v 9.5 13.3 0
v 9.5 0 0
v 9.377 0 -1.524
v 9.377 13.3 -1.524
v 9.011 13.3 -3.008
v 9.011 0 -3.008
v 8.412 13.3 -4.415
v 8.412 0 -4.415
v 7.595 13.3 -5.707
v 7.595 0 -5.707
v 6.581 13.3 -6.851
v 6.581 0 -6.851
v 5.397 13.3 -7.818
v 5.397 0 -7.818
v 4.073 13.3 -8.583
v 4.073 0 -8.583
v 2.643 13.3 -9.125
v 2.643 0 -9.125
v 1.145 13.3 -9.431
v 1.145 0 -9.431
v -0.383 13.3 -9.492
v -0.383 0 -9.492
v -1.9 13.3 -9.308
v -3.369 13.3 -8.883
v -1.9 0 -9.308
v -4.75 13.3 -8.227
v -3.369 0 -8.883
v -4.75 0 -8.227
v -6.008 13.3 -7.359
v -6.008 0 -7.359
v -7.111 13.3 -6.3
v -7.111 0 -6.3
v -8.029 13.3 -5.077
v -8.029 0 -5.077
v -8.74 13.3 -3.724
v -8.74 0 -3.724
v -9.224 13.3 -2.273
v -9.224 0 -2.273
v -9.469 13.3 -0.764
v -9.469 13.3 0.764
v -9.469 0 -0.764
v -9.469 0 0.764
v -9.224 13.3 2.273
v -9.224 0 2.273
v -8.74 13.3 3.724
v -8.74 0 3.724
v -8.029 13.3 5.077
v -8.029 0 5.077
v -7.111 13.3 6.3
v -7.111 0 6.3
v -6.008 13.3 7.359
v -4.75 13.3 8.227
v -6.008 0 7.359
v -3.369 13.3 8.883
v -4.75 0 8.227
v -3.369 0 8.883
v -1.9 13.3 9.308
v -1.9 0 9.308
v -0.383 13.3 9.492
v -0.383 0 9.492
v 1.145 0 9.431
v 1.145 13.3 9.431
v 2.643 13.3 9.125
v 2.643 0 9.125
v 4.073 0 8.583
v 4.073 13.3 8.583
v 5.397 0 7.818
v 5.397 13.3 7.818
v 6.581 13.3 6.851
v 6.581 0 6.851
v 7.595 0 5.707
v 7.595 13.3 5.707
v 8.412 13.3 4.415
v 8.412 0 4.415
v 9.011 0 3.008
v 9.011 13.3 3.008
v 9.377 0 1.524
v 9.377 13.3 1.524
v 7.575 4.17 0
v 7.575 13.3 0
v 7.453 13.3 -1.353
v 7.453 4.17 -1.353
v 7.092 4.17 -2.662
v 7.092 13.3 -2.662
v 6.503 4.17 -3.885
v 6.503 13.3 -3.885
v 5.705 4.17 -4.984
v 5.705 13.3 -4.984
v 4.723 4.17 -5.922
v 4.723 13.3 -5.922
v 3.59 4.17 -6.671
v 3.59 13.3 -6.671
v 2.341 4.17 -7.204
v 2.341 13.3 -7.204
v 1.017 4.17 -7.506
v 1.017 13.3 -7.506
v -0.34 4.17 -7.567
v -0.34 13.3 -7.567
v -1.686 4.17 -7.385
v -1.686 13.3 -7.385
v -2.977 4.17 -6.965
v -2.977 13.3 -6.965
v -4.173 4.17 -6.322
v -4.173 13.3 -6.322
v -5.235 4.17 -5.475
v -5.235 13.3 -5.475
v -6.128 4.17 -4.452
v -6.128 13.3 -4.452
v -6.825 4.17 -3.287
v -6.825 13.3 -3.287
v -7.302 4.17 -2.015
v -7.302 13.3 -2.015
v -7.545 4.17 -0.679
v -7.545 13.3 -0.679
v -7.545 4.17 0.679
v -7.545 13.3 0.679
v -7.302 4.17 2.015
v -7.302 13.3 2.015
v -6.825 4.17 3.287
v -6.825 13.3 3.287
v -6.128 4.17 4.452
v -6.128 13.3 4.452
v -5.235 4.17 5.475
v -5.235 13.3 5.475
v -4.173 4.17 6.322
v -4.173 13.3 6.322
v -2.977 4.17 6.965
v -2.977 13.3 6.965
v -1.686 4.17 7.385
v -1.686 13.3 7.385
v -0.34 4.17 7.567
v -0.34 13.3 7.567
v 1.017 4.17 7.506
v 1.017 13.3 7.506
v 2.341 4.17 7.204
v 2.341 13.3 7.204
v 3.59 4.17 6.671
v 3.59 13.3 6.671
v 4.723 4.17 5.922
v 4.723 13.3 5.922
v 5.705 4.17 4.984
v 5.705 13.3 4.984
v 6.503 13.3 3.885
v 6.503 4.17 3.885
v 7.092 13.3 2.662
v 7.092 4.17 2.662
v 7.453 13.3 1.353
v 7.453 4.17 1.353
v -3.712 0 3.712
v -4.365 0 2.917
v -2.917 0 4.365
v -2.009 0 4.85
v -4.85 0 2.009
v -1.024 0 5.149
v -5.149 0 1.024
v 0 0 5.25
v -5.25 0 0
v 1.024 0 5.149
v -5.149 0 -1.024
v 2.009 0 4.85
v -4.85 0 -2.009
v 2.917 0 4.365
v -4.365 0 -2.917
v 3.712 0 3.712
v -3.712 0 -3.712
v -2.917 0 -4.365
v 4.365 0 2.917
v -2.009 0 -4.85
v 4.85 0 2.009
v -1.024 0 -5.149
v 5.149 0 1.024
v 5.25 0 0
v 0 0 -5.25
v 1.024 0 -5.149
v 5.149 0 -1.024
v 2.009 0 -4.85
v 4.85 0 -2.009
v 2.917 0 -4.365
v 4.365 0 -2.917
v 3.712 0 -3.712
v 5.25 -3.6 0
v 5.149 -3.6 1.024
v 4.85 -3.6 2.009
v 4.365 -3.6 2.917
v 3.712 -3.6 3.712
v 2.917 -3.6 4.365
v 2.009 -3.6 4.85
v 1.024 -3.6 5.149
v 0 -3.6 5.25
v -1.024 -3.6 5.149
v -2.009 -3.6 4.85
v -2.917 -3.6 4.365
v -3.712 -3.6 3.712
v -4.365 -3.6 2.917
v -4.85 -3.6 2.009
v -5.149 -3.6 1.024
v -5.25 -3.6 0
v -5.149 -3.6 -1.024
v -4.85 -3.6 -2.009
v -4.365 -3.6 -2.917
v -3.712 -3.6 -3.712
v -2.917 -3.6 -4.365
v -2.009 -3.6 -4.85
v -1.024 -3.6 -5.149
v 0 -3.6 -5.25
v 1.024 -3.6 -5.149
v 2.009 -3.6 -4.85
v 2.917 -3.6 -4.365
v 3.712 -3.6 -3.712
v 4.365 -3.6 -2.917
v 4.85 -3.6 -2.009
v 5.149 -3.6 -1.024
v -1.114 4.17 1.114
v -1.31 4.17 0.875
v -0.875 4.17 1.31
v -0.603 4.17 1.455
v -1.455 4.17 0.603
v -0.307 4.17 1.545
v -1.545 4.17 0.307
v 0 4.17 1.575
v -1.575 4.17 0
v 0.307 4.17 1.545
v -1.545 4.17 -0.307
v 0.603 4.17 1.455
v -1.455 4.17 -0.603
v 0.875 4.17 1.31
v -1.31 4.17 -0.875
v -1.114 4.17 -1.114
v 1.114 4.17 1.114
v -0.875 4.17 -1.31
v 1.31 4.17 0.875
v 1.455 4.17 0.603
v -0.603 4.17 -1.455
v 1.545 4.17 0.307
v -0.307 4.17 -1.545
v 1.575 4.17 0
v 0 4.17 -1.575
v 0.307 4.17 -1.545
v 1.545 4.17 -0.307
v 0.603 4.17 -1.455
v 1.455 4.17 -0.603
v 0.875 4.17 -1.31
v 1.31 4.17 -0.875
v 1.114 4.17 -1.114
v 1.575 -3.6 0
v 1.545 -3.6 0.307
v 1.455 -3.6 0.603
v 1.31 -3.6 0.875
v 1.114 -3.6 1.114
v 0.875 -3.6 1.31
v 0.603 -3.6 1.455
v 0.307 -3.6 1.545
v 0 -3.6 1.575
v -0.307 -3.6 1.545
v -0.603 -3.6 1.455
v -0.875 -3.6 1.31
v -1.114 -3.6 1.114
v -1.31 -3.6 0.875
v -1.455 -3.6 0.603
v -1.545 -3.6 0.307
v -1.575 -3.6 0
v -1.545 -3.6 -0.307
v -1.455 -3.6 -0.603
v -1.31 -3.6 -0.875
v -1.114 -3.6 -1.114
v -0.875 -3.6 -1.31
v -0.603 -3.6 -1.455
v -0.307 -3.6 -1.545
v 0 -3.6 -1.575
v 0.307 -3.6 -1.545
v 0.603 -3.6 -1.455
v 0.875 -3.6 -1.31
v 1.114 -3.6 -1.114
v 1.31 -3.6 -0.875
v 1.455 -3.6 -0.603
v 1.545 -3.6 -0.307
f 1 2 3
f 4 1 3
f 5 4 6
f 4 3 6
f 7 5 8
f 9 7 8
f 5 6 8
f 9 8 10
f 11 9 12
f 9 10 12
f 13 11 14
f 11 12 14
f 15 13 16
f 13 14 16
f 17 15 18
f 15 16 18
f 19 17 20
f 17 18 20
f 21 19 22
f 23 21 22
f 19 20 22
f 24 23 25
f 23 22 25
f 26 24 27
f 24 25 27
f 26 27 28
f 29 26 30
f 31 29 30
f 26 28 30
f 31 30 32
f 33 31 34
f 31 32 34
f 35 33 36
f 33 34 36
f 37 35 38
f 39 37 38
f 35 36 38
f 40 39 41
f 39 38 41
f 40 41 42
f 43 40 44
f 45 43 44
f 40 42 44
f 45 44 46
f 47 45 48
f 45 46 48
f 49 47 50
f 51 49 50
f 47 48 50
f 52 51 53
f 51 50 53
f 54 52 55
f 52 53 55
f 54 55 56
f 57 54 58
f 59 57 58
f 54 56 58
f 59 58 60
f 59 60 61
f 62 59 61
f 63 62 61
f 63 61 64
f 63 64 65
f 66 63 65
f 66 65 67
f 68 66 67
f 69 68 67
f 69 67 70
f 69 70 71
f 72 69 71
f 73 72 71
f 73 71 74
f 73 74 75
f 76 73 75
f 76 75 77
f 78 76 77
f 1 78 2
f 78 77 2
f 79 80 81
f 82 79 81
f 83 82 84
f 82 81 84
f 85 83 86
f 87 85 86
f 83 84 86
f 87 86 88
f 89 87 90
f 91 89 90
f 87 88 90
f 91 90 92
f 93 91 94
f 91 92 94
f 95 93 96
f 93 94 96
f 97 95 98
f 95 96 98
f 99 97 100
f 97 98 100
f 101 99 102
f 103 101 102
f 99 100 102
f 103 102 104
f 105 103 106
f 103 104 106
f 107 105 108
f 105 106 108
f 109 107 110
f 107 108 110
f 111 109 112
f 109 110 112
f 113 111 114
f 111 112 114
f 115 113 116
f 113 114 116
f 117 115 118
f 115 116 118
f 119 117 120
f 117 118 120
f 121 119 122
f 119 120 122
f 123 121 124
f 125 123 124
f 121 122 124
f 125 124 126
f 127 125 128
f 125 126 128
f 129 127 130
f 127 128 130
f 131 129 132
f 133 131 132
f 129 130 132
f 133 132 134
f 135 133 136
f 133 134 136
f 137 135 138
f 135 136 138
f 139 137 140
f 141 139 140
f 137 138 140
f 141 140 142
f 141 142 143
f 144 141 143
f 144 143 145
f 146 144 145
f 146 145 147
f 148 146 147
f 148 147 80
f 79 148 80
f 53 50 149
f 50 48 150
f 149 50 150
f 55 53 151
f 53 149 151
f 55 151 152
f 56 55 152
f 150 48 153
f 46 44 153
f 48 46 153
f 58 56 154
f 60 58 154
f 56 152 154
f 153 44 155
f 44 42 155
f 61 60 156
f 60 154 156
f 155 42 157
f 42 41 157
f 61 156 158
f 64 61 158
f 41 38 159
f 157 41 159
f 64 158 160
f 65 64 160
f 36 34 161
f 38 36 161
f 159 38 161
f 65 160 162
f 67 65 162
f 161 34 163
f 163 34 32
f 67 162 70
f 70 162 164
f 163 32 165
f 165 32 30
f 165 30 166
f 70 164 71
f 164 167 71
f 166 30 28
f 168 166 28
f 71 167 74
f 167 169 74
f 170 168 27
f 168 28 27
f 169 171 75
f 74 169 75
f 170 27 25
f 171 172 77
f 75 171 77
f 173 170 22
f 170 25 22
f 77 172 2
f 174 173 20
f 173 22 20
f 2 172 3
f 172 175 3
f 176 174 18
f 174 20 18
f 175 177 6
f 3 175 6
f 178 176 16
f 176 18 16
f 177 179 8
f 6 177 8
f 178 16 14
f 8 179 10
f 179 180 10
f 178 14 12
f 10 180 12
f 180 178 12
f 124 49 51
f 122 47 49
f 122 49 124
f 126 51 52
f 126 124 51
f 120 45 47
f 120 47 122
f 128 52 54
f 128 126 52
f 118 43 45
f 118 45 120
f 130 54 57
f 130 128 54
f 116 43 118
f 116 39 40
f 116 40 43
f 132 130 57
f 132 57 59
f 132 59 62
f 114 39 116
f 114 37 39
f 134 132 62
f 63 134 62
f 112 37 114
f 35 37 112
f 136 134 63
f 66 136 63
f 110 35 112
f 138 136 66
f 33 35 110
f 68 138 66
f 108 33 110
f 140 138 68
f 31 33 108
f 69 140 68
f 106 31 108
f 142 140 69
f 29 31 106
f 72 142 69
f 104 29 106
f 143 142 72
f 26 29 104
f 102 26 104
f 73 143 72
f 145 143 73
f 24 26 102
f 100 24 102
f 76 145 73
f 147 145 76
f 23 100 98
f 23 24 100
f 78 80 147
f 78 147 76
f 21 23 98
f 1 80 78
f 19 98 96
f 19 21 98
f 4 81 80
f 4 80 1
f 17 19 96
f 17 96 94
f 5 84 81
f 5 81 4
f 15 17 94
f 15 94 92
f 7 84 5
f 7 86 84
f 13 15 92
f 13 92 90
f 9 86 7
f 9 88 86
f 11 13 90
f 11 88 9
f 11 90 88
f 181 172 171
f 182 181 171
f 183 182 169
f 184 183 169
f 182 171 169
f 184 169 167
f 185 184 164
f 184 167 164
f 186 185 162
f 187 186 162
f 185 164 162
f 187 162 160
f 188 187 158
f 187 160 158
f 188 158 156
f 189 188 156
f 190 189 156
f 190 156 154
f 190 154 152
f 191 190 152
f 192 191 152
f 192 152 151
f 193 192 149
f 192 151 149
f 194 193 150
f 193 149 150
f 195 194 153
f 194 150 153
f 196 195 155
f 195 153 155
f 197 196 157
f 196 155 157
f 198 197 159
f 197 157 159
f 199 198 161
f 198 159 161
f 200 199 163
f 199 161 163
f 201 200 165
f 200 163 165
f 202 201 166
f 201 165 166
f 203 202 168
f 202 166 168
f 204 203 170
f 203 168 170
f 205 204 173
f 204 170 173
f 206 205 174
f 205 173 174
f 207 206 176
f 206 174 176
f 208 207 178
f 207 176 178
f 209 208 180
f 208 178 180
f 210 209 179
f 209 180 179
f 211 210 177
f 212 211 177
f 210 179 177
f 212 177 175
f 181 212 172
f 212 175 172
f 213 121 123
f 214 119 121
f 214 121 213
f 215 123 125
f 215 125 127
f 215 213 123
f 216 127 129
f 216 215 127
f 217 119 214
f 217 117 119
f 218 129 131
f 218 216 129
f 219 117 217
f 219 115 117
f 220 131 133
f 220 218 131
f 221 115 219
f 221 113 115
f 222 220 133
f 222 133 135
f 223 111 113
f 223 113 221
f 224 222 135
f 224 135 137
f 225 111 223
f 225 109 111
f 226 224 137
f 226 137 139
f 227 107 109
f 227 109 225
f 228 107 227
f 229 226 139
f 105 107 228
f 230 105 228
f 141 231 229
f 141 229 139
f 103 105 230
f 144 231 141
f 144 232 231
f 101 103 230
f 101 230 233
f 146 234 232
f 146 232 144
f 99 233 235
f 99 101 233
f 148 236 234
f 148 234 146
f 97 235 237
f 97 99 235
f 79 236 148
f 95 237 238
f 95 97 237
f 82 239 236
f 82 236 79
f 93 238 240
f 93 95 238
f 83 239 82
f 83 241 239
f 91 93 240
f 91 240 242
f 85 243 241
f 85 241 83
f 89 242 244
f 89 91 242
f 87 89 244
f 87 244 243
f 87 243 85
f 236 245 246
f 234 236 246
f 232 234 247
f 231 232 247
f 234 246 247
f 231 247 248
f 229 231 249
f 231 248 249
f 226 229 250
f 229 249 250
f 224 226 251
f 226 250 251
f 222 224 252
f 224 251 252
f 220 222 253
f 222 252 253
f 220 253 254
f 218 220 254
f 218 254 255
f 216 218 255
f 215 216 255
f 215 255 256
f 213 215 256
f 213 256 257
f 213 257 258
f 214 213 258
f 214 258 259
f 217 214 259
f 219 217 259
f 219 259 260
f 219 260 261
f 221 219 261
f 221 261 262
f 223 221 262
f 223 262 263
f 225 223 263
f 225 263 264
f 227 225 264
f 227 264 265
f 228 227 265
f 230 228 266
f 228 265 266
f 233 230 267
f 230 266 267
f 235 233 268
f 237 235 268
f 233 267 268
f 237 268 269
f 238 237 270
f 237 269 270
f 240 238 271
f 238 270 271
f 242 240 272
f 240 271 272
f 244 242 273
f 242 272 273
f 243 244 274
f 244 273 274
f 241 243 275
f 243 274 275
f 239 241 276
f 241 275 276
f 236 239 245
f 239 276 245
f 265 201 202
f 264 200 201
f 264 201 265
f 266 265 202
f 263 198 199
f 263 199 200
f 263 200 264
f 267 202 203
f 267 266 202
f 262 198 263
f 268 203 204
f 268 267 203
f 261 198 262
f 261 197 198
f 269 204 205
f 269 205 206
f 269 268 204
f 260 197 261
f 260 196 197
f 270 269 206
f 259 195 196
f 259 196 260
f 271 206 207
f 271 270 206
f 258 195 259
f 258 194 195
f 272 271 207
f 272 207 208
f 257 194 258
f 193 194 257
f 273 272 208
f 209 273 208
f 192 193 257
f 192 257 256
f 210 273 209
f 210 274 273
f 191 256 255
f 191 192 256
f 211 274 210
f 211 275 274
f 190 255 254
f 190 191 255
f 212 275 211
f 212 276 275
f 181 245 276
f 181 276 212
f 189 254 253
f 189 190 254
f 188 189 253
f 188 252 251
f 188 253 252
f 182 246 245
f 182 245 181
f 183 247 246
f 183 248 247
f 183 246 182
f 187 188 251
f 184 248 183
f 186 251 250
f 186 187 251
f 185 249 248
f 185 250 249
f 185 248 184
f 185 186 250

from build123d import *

# Parameters (mm, degrees)
ESQUISSE1_R             = 9.5
BOSS_EXTRU_2_DEPTH      = 13.3
ESQUISSE3_R             = 5.25
BOSS_EXTRU_3_DEPTH      = 3.6
ESQUISSE4_R             = 7.575
ENL_V_MAT_EXTRU_1_DEPTH = 9.13
ESQUISSE5_R             = 1.575
ENL_V_MAT_EXTRU_2_DEPTH = 9.13


with BuildPart() as part:
    # Esquisse1 → Boss.-Extru.2 (new body)
    with BuildSketch(Plane(origin=(0, 0, 0), x_dir=(1, 0, 0), z_dir=(0, 1, 0))):
        Circle(ESQUISSE1_R)
    extrude(amount=BOSS_EXTRU_2_DEPTH)

    # Esquisse3 → Boss.-Extru.3 (add)
    with BuildSketch(Plane.XZ):
        Circle(ESQUISSE3_R)
    extrude(amount=BOSS_EXTRU_3_DEPTH)

    # Esquisse4 → Enlèv. mat.-Extru.1 (cut)
    with BuildSketch(Plane(origin=(0, 13.3, 0), x_dir=(1, 0, 0), z_dir=(0, 1, 0))):
        Circle(ESQUISSE4_R)
    extrude(amount=-ENL_V_MAT_EXTRU_1_DEPTH, mode=Mode.SUBTRACT)

    # Esquisse5 → Enlèv. mat.-Extru.2 (cut)
    with BuildSketch(Plane.XZ.offset(3.6)):
        Circle(ESQUISSE5_R)
    extrude(amount=-ENL_V_MAT_EXTRU_2_DEPTH, mode=Mode.SUBTRACT)


solid = part.part
